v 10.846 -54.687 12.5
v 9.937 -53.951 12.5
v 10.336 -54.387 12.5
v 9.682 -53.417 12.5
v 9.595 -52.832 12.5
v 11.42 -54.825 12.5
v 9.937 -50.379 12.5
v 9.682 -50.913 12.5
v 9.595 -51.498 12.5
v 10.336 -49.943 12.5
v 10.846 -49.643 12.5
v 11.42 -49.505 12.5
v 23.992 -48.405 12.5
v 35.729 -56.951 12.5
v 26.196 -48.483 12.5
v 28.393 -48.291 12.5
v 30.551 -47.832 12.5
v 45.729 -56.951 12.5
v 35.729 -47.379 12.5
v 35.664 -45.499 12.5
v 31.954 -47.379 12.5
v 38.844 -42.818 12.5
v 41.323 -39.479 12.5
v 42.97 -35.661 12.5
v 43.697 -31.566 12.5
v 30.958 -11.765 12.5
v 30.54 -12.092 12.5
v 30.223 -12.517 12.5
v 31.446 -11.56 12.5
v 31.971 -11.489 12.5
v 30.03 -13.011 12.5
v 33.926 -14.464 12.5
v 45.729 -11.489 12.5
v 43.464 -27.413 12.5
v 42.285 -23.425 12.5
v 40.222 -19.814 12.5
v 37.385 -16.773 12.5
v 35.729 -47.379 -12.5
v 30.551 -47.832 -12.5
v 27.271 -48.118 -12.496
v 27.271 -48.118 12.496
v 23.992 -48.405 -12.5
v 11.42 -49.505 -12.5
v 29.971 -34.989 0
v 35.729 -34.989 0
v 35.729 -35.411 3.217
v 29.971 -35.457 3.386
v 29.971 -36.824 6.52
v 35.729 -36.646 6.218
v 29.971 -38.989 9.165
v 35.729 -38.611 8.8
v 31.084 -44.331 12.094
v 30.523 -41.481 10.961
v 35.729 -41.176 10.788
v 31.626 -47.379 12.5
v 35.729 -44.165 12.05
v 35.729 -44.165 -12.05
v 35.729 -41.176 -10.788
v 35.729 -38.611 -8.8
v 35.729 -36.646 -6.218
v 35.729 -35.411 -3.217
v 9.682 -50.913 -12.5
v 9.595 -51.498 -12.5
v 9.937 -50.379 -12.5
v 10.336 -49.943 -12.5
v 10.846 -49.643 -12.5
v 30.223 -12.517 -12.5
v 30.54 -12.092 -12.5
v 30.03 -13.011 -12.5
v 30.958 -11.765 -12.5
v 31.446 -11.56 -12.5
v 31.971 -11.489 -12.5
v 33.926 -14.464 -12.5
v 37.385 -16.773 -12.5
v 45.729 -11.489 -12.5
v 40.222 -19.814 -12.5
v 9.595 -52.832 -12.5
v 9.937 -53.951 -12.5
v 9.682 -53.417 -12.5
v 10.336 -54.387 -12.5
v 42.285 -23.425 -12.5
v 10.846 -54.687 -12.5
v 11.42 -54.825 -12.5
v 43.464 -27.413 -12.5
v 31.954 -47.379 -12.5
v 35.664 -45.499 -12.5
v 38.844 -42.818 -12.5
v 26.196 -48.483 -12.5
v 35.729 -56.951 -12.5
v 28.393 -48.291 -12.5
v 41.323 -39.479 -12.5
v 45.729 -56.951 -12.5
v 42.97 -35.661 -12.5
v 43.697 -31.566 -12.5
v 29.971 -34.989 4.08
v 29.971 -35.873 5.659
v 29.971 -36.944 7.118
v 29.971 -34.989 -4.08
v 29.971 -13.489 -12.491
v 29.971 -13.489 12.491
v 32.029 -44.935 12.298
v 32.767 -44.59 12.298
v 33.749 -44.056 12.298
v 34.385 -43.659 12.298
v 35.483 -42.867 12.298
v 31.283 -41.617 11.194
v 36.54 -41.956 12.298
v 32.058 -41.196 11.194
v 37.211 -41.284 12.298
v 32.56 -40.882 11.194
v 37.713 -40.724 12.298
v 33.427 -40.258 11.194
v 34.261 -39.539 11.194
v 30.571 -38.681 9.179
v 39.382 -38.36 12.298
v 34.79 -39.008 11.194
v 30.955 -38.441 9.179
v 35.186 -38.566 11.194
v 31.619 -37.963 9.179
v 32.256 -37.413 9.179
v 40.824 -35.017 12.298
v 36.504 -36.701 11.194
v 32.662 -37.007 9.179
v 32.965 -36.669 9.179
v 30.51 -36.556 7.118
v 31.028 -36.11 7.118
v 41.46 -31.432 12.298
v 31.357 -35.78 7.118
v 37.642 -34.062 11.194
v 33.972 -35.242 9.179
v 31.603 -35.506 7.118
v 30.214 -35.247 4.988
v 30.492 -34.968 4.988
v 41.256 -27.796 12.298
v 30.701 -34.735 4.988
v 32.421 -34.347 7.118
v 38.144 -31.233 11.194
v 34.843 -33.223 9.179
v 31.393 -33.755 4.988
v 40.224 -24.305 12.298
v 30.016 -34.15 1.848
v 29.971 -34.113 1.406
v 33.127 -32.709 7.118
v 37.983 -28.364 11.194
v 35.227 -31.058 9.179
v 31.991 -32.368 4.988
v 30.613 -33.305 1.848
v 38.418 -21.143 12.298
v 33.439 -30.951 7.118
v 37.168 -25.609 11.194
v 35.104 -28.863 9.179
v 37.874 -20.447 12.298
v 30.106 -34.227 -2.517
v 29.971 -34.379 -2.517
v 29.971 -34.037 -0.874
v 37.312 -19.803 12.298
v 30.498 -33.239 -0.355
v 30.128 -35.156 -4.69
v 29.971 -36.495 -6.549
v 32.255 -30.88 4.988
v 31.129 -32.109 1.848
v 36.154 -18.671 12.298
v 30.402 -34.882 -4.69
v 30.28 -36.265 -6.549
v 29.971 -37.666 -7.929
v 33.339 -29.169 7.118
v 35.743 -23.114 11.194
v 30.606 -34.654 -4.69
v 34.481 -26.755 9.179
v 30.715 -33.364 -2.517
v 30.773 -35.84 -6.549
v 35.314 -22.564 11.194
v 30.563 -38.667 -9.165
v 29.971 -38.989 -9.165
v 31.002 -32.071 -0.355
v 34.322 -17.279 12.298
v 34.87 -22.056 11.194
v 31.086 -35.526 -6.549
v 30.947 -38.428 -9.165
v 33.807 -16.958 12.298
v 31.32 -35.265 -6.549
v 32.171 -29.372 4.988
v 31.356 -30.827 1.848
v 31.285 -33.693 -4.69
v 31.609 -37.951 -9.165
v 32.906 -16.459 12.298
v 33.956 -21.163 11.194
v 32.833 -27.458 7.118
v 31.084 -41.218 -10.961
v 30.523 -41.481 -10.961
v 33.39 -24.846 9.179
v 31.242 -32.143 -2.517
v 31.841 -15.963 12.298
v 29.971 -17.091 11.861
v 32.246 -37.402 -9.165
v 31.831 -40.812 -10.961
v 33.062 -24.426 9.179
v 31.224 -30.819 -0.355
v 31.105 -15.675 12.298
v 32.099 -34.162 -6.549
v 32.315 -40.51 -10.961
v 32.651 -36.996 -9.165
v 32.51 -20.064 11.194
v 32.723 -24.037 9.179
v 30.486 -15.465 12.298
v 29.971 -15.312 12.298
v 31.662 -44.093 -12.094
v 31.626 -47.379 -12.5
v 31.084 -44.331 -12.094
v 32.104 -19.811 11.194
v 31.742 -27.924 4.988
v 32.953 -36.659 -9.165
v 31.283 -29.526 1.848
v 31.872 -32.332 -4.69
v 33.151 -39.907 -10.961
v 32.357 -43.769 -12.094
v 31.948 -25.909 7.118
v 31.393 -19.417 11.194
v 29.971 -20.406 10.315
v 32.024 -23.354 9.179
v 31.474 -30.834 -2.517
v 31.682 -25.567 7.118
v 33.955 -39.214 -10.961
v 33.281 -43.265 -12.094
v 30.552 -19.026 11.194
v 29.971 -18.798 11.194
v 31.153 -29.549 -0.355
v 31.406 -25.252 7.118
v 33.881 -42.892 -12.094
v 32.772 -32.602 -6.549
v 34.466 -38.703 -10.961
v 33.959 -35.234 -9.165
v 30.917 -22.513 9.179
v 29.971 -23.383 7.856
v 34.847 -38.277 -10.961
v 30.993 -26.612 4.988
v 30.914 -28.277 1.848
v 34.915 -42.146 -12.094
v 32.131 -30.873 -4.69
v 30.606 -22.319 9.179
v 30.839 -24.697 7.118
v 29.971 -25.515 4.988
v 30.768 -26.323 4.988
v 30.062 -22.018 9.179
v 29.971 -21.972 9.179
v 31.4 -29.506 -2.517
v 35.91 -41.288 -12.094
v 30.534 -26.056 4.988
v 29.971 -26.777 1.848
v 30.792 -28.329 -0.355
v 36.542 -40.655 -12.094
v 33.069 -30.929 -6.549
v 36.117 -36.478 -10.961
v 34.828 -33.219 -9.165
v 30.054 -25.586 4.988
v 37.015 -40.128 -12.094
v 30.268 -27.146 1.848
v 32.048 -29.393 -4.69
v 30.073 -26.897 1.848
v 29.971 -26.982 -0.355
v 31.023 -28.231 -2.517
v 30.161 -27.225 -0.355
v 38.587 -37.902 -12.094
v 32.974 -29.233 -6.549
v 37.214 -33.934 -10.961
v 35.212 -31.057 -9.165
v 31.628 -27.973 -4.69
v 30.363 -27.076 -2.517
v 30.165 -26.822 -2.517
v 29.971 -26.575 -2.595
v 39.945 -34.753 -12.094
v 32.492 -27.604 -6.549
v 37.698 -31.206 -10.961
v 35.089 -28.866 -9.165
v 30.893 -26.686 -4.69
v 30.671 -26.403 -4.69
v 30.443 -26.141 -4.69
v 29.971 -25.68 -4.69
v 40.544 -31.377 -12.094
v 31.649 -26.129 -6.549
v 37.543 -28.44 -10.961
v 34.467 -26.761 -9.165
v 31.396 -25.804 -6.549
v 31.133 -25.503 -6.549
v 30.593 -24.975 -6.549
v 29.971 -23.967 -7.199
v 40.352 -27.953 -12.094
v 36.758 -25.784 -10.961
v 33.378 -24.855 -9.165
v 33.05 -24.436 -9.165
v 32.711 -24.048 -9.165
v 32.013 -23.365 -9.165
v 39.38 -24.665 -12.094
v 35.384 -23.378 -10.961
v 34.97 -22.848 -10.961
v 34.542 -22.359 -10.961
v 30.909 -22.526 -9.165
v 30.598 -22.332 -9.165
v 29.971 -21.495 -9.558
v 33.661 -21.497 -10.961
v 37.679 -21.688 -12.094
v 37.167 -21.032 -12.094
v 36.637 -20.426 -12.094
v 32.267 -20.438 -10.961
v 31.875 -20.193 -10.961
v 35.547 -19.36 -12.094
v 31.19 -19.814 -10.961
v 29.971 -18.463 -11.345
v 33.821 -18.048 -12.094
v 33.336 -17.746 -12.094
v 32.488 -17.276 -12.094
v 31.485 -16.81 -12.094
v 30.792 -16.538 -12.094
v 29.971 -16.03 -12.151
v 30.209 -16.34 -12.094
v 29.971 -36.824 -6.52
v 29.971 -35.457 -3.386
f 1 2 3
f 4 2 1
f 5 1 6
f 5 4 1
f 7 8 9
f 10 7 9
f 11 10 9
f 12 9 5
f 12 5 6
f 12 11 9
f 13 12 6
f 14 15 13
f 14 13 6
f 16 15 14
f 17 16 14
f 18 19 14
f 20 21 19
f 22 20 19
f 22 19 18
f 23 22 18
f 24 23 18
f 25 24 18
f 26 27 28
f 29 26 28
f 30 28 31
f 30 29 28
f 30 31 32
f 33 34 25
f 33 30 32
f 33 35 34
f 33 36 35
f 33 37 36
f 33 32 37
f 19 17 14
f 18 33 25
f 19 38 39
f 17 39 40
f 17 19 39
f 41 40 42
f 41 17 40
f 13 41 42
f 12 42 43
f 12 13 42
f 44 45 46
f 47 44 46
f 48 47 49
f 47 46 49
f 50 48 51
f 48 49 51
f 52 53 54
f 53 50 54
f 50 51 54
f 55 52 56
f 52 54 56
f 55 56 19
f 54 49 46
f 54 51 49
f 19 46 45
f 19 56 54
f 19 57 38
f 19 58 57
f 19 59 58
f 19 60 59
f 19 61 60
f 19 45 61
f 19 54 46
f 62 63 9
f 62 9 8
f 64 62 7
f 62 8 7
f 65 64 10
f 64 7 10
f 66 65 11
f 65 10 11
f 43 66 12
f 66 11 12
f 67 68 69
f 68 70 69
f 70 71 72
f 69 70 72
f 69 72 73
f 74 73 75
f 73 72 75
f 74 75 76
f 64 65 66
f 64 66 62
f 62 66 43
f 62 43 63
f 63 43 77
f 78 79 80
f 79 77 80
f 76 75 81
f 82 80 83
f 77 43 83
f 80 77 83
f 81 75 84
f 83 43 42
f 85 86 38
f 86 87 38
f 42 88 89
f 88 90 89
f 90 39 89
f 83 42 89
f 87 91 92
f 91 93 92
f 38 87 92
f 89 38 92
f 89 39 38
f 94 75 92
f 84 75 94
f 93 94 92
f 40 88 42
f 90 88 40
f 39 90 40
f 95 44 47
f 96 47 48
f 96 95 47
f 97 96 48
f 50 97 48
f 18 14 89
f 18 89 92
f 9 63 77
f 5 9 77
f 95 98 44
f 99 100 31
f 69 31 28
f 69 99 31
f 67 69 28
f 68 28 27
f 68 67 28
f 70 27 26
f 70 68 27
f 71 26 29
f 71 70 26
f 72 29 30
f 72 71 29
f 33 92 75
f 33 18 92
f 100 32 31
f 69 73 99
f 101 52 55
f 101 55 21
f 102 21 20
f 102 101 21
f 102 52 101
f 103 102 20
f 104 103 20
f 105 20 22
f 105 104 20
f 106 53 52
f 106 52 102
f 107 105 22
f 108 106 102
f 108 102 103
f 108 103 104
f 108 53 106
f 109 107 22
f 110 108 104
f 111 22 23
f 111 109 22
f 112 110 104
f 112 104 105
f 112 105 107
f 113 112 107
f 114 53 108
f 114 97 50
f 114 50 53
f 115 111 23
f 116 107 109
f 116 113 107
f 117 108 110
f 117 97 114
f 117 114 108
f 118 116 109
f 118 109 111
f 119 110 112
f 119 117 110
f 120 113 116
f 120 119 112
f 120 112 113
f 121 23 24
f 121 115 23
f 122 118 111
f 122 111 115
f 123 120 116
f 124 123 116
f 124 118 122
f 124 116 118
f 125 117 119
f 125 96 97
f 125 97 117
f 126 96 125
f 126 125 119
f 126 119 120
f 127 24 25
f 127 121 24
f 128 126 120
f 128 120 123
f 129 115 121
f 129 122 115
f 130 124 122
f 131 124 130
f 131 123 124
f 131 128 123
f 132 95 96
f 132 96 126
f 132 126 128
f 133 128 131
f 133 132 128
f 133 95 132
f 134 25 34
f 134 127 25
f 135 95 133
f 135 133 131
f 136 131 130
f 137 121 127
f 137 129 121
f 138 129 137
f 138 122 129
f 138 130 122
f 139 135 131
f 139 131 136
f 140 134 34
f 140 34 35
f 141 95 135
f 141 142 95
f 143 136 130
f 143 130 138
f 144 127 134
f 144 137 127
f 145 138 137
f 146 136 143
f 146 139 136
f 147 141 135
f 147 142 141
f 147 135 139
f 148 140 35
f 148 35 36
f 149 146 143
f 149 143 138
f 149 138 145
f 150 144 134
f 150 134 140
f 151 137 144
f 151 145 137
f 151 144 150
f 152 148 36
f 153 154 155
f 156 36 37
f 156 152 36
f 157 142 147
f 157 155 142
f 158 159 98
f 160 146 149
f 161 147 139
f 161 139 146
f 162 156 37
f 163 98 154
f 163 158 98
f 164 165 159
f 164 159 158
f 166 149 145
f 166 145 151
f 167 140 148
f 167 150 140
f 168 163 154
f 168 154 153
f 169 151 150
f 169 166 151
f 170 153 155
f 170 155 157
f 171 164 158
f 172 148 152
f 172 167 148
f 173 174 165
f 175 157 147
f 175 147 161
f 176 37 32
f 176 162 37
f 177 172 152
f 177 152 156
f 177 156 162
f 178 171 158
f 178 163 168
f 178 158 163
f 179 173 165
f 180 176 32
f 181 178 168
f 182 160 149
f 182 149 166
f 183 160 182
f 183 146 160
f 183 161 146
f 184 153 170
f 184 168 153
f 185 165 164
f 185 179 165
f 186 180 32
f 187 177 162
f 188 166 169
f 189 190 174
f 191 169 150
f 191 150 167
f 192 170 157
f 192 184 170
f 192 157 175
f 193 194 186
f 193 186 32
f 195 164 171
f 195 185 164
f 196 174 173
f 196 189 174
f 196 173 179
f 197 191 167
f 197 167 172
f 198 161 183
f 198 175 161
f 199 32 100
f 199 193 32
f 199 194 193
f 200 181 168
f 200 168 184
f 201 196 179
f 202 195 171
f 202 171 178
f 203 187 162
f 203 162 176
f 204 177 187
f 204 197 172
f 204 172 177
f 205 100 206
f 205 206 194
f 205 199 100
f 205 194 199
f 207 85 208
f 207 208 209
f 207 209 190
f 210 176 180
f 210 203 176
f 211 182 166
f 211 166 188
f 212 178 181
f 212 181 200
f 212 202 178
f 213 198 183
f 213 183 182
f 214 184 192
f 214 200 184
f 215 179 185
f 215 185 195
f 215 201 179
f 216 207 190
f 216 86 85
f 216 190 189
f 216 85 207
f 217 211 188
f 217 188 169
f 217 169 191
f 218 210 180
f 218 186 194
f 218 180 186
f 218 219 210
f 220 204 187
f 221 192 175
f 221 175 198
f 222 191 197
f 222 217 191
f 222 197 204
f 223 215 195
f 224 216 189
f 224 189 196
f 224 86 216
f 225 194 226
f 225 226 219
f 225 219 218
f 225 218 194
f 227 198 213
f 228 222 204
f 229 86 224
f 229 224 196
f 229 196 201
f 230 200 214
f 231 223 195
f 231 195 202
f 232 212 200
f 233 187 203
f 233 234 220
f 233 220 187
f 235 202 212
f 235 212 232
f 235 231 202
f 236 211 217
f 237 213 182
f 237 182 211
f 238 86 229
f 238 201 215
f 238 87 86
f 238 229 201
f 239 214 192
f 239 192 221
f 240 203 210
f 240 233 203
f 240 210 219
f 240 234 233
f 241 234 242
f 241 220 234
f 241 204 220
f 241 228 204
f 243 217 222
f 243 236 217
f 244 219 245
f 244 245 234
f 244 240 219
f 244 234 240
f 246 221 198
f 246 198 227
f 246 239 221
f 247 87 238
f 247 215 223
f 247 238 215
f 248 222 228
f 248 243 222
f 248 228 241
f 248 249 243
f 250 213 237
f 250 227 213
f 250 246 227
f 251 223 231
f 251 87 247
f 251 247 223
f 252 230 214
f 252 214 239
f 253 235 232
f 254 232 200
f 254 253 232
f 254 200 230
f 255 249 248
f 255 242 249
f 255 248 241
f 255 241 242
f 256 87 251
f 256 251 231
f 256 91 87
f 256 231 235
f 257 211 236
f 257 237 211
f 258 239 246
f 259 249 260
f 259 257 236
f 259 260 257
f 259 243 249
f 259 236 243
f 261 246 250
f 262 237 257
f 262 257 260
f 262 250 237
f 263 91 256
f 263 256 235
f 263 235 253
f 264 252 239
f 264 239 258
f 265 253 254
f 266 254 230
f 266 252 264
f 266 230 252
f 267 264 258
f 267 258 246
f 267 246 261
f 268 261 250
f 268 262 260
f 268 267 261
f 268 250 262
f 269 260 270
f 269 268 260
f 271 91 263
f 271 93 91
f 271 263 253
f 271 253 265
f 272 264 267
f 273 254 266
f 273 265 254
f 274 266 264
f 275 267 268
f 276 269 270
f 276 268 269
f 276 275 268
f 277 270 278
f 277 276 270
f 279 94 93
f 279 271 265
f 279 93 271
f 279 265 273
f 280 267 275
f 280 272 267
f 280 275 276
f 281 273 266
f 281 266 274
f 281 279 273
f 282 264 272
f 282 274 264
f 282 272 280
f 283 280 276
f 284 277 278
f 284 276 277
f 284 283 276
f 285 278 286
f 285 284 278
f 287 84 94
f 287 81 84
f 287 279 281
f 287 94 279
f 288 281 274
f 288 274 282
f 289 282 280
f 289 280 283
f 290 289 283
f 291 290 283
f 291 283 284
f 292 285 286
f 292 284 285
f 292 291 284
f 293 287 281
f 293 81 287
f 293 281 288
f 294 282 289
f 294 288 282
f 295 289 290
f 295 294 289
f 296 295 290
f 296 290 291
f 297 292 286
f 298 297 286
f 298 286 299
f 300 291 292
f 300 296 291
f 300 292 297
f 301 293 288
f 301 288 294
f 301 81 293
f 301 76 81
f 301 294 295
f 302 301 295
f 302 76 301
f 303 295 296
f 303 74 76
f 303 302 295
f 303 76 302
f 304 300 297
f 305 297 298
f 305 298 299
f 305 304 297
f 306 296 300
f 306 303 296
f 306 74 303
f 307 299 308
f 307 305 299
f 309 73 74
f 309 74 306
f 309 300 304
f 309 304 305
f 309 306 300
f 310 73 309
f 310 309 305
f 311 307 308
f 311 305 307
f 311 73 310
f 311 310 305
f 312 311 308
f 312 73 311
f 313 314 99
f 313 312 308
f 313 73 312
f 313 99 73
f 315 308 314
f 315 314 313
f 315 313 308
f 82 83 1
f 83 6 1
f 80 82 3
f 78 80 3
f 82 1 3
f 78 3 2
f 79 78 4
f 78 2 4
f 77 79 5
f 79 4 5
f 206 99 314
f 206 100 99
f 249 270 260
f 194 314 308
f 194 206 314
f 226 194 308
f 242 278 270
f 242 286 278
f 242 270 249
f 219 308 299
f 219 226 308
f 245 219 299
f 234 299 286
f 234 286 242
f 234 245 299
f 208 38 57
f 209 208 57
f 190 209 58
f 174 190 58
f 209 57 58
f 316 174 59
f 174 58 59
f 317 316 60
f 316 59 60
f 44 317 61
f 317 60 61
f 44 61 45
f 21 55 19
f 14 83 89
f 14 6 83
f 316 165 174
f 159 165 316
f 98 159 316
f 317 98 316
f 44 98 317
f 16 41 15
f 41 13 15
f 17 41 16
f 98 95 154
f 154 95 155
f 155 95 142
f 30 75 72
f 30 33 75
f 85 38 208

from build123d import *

# Parameters (mm, degrees)
BOSS_EXTRUDE1_DEPTH = 12.5
BOSS_EXTRUDE2_DEPTH = 5.757359
FILLET2_R           = 2


with BuildPart() as part:
    # Sketch2 → Boss-Extrude1 (new, symmetric)
    with BuildSketch(Plane.XY):
        Polygon((29.971417786, -11.489425512), (29.971417786, -34.989425512), (35.728777099, -34.989425512), (35.728777099, -47.37854209), (9.594776891, -49.66497084), (9.594776891, -54.66497084), (35.728777099, -56.951399591), (45.728777099, -56.951399591), (45.728777099, -11.489425512), align=None)
    extrude(amount=BOSS_EXTRUDE1_DEPTH, both=True)

    # Sketch4 → Boss-Extrude2 (add)
    with BuildSketch(Plane.ZY.offset(-35.728777099)):
        with BuildLine():
            Line((-12.5, -34.989425512), (-12.5, -47.37854209))
            Line((-12.5, -47.37854209), (-12.499508185, -47.37854209))
            ThreePointArc((-12.499508185, -47.37854209), (-8.79954425, -38.611474116), (-6.3e-08, -34.989425512))
            Line((-6.3e-08, -34.989425512), (-12.5, -34.989425512))
        make_face()
        with BuildLine():
            Line((12.5, -34.989425512), (-6.3e-08, -34.989425512))
            ThreePointArc((-6.3e-08, -34.989425512), (8.799544205, -38.611474071), (12.499508185, -47.37854209))
            Line((12.499508185, -47.37854209), (12.5, -47.37854209))
            Line((12.5, -47.37854209), (12.5, -34.989425512))
        make_face()
    extrude(amount=BOSS_EXTRUDE2_DEPTH)

    # Sketch3 → Cut-Revolve1 (revolve, cut)
    with BuildSketch(Plane.ZY.offset(-25.728777099)):
        with BuildLine():
            Line((-12.5, -30.489425512), (12.5, -30.489425512))
            Line((12.5, -30.489425512), (12.5, -12.489425512))
            ThreePointArc((12.5, -12.489425512), (0, -24.989425512), (-12.5, -12.489425512))
            Line((-12.5, -12.489425512), (-12.5, -30.489425512))
        make_face()
    revolve(axis=Axis((25.728777099, -30.489425512, -12.5), (0, 0, 1)), mode=Mode.SUBTRACT)

    # Fillet2
    fillet2_edges = [part.edges().sort_by_distance(p)[0] for p in [
        (29.971417786, -11.489425512, 0),
        (9.594776891, -49.66497084, 0),
        (9.594776891, -54.66497084, 0),
    ]]
    fillet(fillet2_edges, radius=FILLET2_R)


solid = part.part
